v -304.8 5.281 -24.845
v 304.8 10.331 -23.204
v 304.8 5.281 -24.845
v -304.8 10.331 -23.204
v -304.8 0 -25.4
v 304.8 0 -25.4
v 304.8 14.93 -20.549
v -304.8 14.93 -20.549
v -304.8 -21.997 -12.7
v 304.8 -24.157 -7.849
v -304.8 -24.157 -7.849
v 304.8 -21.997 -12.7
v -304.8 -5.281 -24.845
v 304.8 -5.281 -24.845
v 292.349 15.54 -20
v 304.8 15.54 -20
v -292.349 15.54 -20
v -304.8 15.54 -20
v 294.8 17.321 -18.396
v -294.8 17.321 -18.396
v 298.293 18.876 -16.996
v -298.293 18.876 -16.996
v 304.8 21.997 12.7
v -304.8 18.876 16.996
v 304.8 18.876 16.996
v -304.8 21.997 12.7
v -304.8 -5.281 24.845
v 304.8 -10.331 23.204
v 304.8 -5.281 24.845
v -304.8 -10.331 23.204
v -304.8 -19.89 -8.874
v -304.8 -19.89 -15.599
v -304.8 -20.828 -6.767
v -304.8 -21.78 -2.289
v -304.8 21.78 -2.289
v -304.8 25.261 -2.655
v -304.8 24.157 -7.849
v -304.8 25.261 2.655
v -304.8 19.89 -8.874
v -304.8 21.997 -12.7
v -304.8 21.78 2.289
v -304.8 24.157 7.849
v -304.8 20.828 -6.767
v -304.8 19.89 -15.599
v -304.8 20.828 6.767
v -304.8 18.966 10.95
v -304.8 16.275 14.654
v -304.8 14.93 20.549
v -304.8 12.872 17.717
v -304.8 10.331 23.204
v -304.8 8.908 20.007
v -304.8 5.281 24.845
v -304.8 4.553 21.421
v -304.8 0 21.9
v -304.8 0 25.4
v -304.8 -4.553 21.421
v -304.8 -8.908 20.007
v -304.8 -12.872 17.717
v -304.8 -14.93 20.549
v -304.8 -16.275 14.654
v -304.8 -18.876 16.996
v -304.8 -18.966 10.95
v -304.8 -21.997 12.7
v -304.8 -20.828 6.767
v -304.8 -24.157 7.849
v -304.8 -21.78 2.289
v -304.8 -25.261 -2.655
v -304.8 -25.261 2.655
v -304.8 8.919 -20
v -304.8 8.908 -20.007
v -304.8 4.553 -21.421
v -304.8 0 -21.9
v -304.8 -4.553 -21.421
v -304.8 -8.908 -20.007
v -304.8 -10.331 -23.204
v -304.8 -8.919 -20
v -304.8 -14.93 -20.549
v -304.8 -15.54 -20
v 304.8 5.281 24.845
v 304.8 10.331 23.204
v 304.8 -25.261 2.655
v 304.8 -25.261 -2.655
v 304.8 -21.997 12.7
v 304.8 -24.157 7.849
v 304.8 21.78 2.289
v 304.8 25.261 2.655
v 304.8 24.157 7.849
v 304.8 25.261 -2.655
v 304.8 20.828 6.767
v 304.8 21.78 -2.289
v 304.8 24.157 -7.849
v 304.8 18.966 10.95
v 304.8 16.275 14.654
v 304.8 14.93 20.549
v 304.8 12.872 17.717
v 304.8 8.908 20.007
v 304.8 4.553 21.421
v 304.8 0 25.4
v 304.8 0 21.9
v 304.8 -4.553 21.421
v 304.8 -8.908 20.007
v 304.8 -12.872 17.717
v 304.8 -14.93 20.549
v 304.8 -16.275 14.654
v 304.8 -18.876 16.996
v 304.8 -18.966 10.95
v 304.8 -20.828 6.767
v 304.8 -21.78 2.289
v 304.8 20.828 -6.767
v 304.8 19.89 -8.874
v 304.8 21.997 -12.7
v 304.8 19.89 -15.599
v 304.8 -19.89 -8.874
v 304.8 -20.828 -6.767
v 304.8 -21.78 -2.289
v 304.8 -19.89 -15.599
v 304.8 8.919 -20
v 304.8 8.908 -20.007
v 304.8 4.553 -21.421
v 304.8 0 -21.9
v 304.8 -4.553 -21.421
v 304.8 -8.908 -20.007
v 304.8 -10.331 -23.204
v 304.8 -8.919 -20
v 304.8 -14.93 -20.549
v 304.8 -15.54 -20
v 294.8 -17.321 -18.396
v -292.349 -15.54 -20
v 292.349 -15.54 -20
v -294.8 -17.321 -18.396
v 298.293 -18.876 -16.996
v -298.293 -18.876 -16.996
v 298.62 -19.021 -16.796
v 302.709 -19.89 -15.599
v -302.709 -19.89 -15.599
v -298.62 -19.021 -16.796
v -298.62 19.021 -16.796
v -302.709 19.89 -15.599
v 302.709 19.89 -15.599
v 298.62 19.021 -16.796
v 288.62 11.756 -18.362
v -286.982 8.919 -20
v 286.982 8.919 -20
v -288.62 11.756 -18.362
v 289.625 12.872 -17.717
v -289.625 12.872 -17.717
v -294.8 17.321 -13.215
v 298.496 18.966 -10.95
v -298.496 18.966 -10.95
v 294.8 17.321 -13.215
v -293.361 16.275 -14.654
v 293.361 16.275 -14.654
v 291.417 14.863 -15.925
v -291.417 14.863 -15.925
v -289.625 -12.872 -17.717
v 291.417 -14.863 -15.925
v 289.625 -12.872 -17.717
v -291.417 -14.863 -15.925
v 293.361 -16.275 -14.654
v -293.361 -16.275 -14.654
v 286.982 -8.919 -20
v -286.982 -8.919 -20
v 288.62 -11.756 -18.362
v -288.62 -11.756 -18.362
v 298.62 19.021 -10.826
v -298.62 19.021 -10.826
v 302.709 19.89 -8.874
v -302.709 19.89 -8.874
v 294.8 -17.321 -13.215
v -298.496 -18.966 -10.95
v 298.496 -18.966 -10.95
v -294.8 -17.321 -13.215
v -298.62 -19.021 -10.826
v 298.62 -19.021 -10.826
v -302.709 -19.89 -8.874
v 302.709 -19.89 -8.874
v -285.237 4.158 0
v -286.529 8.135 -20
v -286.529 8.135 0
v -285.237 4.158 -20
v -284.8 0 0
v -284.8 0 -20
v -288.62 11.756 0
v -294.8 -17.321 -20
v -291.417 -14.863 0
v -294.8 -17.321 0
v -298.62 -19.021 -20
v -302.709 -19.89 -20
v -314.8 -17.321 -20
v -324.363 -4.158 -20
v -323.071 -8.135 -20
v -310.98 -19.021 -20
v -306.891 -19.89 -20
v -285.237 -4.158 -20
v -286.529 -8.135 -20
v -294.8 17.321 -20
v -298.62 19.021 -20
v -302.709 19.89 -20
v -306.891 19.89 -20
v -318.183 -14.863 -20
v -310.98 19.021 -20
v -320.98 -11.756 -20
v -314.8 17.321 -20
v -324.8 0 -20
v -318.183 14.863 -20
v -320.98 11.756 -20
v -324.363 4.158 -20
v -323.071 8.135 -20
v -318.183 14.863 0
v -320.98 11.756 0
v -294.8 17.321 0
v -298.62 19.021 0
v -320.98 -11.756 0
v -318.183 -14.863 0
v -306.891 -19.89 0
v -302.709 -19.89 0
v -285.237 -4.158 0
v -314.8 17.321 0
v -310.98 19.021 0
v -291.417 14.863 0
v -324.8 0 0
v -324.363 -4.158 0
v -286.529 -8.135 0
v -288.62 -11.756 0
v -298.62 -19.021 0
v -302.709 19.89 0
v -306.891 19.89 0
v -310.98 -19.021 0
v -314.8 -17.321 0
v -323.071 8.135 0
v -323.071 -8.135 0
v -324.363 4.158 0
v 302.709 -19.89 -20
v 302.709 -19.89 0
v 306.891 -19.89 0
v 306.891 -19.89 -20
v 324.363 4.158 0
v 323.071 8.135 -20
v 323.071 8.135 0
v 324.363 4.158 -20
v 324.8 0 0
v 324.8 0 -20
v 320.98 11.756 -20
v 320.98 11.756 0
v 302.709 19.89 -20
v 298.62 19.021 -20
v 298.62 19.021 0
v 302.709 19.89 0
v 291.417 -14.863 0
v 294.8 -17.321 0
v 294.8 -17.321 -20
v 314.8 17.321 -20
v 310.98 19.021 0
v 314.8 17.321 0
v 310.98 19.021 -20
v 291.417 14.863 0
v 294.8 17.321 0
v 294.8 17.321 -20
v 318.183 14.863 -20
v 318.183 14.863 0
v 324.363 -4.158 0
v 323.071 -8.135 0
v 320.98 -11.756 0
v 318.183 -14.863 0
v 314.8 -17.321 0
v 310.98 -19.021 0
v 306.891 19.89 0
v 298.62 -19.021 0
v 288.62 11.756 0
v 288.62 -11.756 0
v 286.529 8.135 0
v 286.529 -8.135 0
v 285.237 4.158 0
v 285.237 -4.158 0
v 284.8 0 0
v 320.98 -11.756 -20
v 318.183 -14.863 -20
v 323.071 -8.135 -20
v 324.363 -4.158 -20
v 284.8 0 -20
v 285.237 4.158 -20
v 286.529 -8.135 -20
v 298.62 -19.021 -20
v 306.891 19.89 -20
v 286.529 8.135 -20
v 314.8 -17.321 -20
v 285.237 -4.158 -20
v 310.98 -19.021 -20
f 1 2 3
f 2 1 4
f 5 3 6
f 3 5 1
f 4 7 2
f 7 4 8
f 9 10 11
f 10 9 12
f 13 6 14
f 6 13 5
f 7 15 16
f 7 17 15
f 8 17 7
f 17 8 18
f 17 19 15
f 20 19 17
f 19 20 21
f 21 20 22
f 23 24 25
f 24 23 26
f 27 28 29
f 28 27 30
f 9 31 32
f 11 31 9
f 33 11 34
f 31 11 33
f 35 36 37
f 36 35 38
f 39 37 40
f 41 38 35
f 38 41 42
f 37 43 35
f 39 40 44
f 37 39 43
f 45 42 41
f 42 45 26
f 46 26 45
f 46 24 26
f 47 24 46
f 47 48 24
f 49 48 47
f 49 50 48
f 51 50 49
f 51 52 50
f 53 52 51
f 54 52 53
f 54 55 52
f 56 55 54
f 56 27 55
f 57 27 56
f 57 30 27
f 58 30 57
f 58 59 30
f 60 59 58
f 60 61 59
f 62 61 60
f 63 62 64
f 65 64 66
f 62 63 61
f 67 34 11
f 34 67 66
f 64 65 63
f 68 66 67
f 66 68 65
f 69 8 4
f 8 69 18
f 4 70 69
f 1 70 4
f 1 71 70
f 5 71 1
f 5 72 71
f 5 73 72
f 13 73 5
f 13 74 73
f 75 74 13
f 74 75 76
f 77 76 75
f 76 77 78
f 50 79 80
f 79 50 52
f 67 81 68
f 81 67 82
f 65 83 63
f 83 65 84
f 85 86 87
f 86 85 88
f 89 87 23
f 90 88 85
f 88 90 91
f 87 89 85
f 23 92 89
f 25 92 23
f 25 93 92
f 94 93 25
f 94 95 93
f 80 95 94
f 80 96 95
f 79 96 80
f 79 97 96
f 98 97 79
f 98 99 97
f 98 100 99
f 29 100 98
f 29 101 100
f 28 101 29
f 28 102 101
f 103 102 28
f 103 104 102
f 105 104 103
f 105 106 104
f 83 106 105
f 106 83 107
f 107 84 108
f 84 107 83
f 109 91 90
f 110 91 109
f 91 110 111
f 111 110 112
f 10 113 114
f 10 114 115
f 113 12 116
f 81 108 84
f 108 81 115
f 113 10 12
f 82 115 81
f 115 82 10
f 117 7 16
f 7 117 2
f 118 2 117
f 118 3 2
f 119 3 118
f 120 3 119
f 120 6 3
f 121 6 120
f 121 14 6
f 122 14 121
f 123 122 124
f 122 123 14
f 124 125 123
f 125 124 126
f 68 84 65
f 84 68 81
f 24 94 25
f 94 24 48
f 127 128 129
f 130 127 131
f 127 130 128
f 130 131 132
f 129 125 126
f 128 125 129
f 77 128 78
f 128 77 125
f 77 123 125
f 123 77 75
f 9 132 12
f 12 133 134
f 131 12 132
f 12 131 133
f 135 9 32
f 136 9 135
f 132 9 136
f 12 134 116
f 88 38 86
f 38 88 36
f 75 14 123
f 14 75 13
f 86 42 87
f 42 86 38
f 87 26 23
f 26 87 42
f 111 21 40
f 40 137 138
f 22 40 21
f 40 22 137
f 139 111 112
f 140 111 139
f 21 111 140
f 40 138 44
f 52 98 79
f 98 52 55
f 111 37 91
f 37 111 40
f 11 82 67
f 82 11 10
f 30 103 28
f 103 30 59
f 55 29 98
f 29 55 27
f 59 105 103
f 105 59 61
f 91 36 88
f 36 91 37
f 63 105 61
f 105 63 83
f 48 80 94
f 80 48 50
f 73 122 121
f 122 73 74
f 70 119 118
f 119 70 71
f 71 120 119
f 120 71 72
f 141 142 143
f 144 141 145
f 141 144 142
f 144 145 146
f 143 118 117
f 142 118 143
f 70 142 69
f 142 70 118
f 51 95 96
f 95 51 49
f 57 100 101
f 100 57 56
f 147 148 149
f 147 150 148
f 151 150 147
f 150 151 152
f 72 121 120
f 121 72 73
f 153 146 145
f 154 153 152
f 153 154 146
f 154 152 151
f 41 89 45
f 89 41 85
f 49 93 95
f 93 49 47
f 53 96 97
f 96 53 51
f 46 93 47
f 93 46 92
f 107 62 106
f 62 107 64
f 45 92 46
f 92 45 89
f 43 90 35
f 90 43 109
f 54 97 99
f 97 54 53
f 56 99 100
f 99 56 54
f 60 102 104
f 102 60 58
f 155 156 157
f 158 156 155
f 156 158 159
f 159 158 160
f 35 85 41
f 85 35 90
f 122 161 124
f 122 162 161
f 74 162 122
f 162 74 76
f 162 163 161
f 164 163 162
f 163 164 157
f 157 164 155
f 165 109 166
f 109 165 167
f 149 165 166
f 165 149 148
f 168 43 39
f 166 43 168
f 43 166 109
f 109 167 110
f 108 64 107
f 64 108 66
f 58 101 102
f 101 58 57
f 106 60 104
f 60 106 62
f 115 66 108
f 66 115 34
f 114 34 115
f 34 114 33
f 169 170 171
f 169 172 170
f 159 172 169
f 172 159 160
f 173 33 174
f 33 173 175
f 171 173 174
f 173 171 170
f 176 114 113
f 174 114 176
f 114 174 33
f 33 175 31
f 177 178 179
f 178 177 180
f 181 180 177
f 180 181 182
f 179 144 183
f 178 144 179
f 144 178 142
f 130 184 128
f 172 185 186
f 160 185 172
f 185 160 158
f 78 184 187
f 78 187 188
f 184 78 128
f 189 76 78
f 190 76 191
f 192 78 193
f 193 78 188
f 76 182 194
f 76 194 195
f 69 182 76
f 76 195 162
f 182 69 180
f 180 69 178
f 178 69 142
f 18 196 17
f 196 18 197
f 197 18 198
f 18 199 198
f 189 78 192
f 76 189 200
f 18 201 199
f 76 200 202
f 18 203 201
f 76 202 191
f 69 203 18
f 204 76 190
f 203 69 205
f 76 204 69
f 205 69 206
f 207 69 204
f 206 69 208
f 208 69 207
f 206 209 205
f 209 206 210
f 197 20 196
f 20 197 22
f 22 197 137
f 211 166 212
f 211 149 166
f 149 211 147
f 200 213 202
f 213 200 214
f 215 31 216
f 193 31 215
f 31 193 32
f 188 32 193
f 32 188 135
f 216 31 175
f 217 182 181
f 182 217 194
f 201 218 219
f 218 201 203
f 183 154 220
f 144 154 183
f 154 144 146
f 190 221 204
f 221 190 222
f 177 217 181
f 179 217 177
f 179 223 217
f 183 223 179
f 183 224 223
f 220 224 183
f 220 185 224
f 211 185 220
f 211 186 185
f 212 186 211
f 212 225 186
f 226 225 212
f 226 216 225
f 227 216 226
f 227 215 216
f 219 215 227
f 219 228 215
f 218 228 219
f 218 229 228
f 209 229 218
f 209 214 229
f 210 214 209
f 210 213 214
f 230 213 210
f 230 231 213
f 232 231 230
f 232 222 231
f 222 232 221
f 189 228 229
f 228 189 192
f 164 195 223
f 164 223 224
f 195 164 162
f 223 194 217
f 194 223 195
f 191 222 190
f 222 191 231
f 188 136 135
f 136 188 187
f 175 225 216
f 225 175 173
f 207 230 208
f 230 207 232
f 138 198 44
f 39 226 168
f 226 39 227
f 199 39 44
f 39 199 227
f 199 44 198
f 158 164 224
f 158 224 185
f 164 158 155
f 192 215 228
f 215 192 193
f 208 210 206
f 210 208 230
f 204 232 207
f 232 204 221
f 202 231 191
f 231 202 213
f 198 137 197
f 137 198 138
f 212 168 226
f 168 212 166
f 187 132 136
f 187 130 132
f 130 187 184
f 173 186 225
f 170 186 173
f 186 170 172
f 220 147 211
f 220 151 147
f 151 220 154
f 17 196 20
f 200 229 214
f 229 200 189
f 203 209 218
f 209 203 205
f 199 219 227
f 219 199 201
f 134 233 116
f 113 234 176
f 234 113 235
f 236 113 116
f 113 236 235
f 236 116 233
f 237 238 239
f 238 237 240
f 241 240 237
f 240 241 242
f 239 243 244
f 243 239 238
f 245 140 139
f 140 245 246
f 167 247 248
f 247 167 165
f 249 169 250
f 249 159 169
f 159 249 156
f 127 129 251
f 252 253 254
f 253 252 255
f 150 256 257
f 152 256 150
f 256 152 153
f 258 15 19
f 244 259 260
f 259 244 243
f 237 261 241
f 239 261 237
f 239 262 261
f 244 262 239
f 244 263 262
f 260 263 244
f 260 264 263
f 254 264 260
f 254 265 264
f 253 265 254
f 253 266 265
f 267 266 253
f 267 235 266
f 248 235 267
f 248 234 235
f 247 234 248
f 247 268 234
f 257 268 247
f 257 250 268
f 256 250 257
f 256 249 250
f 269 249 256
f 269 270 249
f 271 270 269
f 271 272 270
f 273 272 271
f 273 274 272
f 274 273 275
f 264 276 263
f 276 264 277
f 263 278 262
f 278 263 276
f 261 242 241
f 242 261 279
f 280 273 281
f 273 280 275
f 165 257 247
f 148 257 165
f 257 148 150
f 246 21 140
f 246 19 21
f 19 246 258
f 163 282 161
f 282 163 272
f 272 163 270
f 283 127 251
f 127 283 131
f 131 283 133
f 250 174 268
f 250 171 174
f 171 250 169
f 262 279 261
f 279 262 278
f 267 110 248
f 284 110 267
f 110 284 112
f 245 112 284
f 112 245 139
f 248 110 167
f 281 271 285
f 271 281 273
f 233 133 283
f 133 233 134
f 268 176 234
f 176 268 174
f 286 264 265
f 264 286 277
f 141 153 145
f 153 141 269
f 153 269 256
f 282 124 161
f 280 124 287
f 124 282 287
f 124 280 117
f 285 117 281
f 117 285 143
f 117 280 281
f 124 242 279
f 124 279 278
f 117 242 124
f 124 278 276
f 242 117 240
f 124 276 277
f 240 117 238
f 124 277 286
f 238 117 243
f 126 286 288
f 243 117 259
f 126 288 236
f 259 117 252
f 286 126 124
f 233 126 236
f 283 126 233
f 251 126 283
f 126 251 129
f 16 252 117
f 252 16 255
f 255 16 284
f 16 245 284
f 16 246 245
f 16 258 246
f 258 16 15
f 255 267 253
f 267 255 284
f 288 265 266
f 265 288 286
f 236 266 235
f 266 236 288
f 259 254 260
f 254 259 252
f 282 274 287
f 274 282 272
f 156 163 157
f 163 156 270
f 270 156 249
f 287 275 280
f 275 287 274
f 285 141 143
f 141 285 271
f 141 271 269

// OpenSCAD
// ====================================================================================
// REVOLUTIONARY TECHNOLOGY COMPANY & UNIVERSITY OF WASHINGTON DEPARTMENT OF PHYSICS
// Subsystem: tools/simulation/frame_stress_analysis.scad
// Objective: Parametric Structural Torsional Stress & Strain Matrix Calculation
// Validates structural deformation thresholds under peak instantaneous EV launching torque
// ====================================================================================

// --- FEA Computational Material Selection Parameters ---
// Set to 1 for 4130 Chromoly Steel Baseline; Set to 2 for Titanium Grade 5 Matrix
SIMULATED_MATERIAL_MODE = 2;

// --- Physical Constant Stress Properties ---
torque_instant_nm  = 1350.00;          // Peak instantaneous variable-reluctance stator torque load
track_slick_grip_mu = 1.65;            // Peak coefficient of friction for sticky Pirelli racing slicks
safety_factor_target = 2.5;            // Mandatory engineering safety headroom constant

// Material Mechanical Matrix Tables
youngs_modulus_gpa = (SIMULATED_MATERIAL_MODE == 2) ? 113.8 : 205.0; // Titanium Grade 5 vs Steel
yield_strength_mpa = (SIMULATED_MATERIAL_MODE == 2) ? 880.0 : 435.0; // Titanium yield limits are vastly higher
density_g_cm3      = (SIMULATED_MATERIAL_MODE == 2) ? 4.43  : 7.85;

// Geometric Chassis Boundary Constraints (mm)
crossmember_length = 609.6;            // Width box profile between front frame rails
tube_outer_radius  = 25.4;             // 2.00-inch diameter outer frame bracing tube
tube_wall_thickness= (SIMULATED_MATERIAL_MODE == 2) ? 3.5 : 2.1;
tube_inner_radius  = tube_outer_radius - tube_wall_thickness;

// --- Mathematical Structural Stress Equations ---

// 1. Calculate Area Moment of Inertia (I) for hollow round chassis structural member tube
area_moment_i = (PI / 4) * (pow(tube_outer_radius, 4) - pow(tube_inner_radius, 4));

// 2. Calculate Peak Bending Moment (M) under hard tire launching shock loads
applied_force_newtons = (torque_instant_nm * 1000) / (tube_outer_radius);
max_bending_moment = (applied_force_newtons * crossmember_length) / 4;

// 3. Compute Structural Flexural Strain Deflection (Sigma Stress)
max_stress_mpa = (max_bending_moment * tube_outer_radius) / area_moment_i;
calculated_safety_margin = yield_strength_mpa / max_stress_mpa;

// --- Diagnostic Status Readout Display Window Console Output ---
echo("=======================================================================");
echo("   REVOLUTIONARY TECH & UW PHYSICS MECHANICAL SIMULATION CORE ACTIVE   ");
echo("=======================================================================");
echo(str("EVALUATING ACTIVE MATERIAL MATRIX PROFILE: ", (SIMULATED_MATERIAL_MODE == 2) ? "TITANIUM_GRADE_5_AVIONICS" : "4130_CHROMOLY_STEEL"));
echo(str("-> Young's Modulus: ", youngs_modulus_gpa, " GPa"));
echo(str("-> Yield Material Strength: ", yield_strength_mpa, " MPa"));
echo(str("-> Calculated Structural Peak Stress Under Launch: ", max_stress_mpa, " MPa"));

if (max_stress_mpa > yield_strength_mpa) {
    echo(str("!!! CRITICAL FAILURE: CHASSIS TUBE SHEAR FAULT DETECTED !!!"));
} else {
    echo(str("-> STATUS: STRUCTURAL ENVELOPE SECURE. Safety Factor Multiplier: ", calculated_safety_margin));
}
echo("=======================================================================");

// Visually render the specific simulated crossmember element to evaluate bending deflection gradients
module render_stressed_crossmember() {
    color((max_stress_mpa > yield_strength_mpa) ? "Red" : ((SIMULATED_MATERIAL_MODE == 2) ? "LightBlue" : "LightGrey")) {
        rotate([0, 90, 0]) {
            difference() {
                cylinder(r=tube_outer_radius, h=crossmember_length, center=true);
                cylinder(r=tube_inner_radius, h=crossmember_length + 5, center=true);
            }
        }
    }
    // Anchor indicators pointing directly to your shocks.scad rubber cage integration locations
    for (offset = [-crossmember_length/2, crossmember_length/2]) {
        translate([offset, 0, -20])
            color("Gold") cylinder(d=40, h=20);
    }
}

render_stressed_crossmember();
